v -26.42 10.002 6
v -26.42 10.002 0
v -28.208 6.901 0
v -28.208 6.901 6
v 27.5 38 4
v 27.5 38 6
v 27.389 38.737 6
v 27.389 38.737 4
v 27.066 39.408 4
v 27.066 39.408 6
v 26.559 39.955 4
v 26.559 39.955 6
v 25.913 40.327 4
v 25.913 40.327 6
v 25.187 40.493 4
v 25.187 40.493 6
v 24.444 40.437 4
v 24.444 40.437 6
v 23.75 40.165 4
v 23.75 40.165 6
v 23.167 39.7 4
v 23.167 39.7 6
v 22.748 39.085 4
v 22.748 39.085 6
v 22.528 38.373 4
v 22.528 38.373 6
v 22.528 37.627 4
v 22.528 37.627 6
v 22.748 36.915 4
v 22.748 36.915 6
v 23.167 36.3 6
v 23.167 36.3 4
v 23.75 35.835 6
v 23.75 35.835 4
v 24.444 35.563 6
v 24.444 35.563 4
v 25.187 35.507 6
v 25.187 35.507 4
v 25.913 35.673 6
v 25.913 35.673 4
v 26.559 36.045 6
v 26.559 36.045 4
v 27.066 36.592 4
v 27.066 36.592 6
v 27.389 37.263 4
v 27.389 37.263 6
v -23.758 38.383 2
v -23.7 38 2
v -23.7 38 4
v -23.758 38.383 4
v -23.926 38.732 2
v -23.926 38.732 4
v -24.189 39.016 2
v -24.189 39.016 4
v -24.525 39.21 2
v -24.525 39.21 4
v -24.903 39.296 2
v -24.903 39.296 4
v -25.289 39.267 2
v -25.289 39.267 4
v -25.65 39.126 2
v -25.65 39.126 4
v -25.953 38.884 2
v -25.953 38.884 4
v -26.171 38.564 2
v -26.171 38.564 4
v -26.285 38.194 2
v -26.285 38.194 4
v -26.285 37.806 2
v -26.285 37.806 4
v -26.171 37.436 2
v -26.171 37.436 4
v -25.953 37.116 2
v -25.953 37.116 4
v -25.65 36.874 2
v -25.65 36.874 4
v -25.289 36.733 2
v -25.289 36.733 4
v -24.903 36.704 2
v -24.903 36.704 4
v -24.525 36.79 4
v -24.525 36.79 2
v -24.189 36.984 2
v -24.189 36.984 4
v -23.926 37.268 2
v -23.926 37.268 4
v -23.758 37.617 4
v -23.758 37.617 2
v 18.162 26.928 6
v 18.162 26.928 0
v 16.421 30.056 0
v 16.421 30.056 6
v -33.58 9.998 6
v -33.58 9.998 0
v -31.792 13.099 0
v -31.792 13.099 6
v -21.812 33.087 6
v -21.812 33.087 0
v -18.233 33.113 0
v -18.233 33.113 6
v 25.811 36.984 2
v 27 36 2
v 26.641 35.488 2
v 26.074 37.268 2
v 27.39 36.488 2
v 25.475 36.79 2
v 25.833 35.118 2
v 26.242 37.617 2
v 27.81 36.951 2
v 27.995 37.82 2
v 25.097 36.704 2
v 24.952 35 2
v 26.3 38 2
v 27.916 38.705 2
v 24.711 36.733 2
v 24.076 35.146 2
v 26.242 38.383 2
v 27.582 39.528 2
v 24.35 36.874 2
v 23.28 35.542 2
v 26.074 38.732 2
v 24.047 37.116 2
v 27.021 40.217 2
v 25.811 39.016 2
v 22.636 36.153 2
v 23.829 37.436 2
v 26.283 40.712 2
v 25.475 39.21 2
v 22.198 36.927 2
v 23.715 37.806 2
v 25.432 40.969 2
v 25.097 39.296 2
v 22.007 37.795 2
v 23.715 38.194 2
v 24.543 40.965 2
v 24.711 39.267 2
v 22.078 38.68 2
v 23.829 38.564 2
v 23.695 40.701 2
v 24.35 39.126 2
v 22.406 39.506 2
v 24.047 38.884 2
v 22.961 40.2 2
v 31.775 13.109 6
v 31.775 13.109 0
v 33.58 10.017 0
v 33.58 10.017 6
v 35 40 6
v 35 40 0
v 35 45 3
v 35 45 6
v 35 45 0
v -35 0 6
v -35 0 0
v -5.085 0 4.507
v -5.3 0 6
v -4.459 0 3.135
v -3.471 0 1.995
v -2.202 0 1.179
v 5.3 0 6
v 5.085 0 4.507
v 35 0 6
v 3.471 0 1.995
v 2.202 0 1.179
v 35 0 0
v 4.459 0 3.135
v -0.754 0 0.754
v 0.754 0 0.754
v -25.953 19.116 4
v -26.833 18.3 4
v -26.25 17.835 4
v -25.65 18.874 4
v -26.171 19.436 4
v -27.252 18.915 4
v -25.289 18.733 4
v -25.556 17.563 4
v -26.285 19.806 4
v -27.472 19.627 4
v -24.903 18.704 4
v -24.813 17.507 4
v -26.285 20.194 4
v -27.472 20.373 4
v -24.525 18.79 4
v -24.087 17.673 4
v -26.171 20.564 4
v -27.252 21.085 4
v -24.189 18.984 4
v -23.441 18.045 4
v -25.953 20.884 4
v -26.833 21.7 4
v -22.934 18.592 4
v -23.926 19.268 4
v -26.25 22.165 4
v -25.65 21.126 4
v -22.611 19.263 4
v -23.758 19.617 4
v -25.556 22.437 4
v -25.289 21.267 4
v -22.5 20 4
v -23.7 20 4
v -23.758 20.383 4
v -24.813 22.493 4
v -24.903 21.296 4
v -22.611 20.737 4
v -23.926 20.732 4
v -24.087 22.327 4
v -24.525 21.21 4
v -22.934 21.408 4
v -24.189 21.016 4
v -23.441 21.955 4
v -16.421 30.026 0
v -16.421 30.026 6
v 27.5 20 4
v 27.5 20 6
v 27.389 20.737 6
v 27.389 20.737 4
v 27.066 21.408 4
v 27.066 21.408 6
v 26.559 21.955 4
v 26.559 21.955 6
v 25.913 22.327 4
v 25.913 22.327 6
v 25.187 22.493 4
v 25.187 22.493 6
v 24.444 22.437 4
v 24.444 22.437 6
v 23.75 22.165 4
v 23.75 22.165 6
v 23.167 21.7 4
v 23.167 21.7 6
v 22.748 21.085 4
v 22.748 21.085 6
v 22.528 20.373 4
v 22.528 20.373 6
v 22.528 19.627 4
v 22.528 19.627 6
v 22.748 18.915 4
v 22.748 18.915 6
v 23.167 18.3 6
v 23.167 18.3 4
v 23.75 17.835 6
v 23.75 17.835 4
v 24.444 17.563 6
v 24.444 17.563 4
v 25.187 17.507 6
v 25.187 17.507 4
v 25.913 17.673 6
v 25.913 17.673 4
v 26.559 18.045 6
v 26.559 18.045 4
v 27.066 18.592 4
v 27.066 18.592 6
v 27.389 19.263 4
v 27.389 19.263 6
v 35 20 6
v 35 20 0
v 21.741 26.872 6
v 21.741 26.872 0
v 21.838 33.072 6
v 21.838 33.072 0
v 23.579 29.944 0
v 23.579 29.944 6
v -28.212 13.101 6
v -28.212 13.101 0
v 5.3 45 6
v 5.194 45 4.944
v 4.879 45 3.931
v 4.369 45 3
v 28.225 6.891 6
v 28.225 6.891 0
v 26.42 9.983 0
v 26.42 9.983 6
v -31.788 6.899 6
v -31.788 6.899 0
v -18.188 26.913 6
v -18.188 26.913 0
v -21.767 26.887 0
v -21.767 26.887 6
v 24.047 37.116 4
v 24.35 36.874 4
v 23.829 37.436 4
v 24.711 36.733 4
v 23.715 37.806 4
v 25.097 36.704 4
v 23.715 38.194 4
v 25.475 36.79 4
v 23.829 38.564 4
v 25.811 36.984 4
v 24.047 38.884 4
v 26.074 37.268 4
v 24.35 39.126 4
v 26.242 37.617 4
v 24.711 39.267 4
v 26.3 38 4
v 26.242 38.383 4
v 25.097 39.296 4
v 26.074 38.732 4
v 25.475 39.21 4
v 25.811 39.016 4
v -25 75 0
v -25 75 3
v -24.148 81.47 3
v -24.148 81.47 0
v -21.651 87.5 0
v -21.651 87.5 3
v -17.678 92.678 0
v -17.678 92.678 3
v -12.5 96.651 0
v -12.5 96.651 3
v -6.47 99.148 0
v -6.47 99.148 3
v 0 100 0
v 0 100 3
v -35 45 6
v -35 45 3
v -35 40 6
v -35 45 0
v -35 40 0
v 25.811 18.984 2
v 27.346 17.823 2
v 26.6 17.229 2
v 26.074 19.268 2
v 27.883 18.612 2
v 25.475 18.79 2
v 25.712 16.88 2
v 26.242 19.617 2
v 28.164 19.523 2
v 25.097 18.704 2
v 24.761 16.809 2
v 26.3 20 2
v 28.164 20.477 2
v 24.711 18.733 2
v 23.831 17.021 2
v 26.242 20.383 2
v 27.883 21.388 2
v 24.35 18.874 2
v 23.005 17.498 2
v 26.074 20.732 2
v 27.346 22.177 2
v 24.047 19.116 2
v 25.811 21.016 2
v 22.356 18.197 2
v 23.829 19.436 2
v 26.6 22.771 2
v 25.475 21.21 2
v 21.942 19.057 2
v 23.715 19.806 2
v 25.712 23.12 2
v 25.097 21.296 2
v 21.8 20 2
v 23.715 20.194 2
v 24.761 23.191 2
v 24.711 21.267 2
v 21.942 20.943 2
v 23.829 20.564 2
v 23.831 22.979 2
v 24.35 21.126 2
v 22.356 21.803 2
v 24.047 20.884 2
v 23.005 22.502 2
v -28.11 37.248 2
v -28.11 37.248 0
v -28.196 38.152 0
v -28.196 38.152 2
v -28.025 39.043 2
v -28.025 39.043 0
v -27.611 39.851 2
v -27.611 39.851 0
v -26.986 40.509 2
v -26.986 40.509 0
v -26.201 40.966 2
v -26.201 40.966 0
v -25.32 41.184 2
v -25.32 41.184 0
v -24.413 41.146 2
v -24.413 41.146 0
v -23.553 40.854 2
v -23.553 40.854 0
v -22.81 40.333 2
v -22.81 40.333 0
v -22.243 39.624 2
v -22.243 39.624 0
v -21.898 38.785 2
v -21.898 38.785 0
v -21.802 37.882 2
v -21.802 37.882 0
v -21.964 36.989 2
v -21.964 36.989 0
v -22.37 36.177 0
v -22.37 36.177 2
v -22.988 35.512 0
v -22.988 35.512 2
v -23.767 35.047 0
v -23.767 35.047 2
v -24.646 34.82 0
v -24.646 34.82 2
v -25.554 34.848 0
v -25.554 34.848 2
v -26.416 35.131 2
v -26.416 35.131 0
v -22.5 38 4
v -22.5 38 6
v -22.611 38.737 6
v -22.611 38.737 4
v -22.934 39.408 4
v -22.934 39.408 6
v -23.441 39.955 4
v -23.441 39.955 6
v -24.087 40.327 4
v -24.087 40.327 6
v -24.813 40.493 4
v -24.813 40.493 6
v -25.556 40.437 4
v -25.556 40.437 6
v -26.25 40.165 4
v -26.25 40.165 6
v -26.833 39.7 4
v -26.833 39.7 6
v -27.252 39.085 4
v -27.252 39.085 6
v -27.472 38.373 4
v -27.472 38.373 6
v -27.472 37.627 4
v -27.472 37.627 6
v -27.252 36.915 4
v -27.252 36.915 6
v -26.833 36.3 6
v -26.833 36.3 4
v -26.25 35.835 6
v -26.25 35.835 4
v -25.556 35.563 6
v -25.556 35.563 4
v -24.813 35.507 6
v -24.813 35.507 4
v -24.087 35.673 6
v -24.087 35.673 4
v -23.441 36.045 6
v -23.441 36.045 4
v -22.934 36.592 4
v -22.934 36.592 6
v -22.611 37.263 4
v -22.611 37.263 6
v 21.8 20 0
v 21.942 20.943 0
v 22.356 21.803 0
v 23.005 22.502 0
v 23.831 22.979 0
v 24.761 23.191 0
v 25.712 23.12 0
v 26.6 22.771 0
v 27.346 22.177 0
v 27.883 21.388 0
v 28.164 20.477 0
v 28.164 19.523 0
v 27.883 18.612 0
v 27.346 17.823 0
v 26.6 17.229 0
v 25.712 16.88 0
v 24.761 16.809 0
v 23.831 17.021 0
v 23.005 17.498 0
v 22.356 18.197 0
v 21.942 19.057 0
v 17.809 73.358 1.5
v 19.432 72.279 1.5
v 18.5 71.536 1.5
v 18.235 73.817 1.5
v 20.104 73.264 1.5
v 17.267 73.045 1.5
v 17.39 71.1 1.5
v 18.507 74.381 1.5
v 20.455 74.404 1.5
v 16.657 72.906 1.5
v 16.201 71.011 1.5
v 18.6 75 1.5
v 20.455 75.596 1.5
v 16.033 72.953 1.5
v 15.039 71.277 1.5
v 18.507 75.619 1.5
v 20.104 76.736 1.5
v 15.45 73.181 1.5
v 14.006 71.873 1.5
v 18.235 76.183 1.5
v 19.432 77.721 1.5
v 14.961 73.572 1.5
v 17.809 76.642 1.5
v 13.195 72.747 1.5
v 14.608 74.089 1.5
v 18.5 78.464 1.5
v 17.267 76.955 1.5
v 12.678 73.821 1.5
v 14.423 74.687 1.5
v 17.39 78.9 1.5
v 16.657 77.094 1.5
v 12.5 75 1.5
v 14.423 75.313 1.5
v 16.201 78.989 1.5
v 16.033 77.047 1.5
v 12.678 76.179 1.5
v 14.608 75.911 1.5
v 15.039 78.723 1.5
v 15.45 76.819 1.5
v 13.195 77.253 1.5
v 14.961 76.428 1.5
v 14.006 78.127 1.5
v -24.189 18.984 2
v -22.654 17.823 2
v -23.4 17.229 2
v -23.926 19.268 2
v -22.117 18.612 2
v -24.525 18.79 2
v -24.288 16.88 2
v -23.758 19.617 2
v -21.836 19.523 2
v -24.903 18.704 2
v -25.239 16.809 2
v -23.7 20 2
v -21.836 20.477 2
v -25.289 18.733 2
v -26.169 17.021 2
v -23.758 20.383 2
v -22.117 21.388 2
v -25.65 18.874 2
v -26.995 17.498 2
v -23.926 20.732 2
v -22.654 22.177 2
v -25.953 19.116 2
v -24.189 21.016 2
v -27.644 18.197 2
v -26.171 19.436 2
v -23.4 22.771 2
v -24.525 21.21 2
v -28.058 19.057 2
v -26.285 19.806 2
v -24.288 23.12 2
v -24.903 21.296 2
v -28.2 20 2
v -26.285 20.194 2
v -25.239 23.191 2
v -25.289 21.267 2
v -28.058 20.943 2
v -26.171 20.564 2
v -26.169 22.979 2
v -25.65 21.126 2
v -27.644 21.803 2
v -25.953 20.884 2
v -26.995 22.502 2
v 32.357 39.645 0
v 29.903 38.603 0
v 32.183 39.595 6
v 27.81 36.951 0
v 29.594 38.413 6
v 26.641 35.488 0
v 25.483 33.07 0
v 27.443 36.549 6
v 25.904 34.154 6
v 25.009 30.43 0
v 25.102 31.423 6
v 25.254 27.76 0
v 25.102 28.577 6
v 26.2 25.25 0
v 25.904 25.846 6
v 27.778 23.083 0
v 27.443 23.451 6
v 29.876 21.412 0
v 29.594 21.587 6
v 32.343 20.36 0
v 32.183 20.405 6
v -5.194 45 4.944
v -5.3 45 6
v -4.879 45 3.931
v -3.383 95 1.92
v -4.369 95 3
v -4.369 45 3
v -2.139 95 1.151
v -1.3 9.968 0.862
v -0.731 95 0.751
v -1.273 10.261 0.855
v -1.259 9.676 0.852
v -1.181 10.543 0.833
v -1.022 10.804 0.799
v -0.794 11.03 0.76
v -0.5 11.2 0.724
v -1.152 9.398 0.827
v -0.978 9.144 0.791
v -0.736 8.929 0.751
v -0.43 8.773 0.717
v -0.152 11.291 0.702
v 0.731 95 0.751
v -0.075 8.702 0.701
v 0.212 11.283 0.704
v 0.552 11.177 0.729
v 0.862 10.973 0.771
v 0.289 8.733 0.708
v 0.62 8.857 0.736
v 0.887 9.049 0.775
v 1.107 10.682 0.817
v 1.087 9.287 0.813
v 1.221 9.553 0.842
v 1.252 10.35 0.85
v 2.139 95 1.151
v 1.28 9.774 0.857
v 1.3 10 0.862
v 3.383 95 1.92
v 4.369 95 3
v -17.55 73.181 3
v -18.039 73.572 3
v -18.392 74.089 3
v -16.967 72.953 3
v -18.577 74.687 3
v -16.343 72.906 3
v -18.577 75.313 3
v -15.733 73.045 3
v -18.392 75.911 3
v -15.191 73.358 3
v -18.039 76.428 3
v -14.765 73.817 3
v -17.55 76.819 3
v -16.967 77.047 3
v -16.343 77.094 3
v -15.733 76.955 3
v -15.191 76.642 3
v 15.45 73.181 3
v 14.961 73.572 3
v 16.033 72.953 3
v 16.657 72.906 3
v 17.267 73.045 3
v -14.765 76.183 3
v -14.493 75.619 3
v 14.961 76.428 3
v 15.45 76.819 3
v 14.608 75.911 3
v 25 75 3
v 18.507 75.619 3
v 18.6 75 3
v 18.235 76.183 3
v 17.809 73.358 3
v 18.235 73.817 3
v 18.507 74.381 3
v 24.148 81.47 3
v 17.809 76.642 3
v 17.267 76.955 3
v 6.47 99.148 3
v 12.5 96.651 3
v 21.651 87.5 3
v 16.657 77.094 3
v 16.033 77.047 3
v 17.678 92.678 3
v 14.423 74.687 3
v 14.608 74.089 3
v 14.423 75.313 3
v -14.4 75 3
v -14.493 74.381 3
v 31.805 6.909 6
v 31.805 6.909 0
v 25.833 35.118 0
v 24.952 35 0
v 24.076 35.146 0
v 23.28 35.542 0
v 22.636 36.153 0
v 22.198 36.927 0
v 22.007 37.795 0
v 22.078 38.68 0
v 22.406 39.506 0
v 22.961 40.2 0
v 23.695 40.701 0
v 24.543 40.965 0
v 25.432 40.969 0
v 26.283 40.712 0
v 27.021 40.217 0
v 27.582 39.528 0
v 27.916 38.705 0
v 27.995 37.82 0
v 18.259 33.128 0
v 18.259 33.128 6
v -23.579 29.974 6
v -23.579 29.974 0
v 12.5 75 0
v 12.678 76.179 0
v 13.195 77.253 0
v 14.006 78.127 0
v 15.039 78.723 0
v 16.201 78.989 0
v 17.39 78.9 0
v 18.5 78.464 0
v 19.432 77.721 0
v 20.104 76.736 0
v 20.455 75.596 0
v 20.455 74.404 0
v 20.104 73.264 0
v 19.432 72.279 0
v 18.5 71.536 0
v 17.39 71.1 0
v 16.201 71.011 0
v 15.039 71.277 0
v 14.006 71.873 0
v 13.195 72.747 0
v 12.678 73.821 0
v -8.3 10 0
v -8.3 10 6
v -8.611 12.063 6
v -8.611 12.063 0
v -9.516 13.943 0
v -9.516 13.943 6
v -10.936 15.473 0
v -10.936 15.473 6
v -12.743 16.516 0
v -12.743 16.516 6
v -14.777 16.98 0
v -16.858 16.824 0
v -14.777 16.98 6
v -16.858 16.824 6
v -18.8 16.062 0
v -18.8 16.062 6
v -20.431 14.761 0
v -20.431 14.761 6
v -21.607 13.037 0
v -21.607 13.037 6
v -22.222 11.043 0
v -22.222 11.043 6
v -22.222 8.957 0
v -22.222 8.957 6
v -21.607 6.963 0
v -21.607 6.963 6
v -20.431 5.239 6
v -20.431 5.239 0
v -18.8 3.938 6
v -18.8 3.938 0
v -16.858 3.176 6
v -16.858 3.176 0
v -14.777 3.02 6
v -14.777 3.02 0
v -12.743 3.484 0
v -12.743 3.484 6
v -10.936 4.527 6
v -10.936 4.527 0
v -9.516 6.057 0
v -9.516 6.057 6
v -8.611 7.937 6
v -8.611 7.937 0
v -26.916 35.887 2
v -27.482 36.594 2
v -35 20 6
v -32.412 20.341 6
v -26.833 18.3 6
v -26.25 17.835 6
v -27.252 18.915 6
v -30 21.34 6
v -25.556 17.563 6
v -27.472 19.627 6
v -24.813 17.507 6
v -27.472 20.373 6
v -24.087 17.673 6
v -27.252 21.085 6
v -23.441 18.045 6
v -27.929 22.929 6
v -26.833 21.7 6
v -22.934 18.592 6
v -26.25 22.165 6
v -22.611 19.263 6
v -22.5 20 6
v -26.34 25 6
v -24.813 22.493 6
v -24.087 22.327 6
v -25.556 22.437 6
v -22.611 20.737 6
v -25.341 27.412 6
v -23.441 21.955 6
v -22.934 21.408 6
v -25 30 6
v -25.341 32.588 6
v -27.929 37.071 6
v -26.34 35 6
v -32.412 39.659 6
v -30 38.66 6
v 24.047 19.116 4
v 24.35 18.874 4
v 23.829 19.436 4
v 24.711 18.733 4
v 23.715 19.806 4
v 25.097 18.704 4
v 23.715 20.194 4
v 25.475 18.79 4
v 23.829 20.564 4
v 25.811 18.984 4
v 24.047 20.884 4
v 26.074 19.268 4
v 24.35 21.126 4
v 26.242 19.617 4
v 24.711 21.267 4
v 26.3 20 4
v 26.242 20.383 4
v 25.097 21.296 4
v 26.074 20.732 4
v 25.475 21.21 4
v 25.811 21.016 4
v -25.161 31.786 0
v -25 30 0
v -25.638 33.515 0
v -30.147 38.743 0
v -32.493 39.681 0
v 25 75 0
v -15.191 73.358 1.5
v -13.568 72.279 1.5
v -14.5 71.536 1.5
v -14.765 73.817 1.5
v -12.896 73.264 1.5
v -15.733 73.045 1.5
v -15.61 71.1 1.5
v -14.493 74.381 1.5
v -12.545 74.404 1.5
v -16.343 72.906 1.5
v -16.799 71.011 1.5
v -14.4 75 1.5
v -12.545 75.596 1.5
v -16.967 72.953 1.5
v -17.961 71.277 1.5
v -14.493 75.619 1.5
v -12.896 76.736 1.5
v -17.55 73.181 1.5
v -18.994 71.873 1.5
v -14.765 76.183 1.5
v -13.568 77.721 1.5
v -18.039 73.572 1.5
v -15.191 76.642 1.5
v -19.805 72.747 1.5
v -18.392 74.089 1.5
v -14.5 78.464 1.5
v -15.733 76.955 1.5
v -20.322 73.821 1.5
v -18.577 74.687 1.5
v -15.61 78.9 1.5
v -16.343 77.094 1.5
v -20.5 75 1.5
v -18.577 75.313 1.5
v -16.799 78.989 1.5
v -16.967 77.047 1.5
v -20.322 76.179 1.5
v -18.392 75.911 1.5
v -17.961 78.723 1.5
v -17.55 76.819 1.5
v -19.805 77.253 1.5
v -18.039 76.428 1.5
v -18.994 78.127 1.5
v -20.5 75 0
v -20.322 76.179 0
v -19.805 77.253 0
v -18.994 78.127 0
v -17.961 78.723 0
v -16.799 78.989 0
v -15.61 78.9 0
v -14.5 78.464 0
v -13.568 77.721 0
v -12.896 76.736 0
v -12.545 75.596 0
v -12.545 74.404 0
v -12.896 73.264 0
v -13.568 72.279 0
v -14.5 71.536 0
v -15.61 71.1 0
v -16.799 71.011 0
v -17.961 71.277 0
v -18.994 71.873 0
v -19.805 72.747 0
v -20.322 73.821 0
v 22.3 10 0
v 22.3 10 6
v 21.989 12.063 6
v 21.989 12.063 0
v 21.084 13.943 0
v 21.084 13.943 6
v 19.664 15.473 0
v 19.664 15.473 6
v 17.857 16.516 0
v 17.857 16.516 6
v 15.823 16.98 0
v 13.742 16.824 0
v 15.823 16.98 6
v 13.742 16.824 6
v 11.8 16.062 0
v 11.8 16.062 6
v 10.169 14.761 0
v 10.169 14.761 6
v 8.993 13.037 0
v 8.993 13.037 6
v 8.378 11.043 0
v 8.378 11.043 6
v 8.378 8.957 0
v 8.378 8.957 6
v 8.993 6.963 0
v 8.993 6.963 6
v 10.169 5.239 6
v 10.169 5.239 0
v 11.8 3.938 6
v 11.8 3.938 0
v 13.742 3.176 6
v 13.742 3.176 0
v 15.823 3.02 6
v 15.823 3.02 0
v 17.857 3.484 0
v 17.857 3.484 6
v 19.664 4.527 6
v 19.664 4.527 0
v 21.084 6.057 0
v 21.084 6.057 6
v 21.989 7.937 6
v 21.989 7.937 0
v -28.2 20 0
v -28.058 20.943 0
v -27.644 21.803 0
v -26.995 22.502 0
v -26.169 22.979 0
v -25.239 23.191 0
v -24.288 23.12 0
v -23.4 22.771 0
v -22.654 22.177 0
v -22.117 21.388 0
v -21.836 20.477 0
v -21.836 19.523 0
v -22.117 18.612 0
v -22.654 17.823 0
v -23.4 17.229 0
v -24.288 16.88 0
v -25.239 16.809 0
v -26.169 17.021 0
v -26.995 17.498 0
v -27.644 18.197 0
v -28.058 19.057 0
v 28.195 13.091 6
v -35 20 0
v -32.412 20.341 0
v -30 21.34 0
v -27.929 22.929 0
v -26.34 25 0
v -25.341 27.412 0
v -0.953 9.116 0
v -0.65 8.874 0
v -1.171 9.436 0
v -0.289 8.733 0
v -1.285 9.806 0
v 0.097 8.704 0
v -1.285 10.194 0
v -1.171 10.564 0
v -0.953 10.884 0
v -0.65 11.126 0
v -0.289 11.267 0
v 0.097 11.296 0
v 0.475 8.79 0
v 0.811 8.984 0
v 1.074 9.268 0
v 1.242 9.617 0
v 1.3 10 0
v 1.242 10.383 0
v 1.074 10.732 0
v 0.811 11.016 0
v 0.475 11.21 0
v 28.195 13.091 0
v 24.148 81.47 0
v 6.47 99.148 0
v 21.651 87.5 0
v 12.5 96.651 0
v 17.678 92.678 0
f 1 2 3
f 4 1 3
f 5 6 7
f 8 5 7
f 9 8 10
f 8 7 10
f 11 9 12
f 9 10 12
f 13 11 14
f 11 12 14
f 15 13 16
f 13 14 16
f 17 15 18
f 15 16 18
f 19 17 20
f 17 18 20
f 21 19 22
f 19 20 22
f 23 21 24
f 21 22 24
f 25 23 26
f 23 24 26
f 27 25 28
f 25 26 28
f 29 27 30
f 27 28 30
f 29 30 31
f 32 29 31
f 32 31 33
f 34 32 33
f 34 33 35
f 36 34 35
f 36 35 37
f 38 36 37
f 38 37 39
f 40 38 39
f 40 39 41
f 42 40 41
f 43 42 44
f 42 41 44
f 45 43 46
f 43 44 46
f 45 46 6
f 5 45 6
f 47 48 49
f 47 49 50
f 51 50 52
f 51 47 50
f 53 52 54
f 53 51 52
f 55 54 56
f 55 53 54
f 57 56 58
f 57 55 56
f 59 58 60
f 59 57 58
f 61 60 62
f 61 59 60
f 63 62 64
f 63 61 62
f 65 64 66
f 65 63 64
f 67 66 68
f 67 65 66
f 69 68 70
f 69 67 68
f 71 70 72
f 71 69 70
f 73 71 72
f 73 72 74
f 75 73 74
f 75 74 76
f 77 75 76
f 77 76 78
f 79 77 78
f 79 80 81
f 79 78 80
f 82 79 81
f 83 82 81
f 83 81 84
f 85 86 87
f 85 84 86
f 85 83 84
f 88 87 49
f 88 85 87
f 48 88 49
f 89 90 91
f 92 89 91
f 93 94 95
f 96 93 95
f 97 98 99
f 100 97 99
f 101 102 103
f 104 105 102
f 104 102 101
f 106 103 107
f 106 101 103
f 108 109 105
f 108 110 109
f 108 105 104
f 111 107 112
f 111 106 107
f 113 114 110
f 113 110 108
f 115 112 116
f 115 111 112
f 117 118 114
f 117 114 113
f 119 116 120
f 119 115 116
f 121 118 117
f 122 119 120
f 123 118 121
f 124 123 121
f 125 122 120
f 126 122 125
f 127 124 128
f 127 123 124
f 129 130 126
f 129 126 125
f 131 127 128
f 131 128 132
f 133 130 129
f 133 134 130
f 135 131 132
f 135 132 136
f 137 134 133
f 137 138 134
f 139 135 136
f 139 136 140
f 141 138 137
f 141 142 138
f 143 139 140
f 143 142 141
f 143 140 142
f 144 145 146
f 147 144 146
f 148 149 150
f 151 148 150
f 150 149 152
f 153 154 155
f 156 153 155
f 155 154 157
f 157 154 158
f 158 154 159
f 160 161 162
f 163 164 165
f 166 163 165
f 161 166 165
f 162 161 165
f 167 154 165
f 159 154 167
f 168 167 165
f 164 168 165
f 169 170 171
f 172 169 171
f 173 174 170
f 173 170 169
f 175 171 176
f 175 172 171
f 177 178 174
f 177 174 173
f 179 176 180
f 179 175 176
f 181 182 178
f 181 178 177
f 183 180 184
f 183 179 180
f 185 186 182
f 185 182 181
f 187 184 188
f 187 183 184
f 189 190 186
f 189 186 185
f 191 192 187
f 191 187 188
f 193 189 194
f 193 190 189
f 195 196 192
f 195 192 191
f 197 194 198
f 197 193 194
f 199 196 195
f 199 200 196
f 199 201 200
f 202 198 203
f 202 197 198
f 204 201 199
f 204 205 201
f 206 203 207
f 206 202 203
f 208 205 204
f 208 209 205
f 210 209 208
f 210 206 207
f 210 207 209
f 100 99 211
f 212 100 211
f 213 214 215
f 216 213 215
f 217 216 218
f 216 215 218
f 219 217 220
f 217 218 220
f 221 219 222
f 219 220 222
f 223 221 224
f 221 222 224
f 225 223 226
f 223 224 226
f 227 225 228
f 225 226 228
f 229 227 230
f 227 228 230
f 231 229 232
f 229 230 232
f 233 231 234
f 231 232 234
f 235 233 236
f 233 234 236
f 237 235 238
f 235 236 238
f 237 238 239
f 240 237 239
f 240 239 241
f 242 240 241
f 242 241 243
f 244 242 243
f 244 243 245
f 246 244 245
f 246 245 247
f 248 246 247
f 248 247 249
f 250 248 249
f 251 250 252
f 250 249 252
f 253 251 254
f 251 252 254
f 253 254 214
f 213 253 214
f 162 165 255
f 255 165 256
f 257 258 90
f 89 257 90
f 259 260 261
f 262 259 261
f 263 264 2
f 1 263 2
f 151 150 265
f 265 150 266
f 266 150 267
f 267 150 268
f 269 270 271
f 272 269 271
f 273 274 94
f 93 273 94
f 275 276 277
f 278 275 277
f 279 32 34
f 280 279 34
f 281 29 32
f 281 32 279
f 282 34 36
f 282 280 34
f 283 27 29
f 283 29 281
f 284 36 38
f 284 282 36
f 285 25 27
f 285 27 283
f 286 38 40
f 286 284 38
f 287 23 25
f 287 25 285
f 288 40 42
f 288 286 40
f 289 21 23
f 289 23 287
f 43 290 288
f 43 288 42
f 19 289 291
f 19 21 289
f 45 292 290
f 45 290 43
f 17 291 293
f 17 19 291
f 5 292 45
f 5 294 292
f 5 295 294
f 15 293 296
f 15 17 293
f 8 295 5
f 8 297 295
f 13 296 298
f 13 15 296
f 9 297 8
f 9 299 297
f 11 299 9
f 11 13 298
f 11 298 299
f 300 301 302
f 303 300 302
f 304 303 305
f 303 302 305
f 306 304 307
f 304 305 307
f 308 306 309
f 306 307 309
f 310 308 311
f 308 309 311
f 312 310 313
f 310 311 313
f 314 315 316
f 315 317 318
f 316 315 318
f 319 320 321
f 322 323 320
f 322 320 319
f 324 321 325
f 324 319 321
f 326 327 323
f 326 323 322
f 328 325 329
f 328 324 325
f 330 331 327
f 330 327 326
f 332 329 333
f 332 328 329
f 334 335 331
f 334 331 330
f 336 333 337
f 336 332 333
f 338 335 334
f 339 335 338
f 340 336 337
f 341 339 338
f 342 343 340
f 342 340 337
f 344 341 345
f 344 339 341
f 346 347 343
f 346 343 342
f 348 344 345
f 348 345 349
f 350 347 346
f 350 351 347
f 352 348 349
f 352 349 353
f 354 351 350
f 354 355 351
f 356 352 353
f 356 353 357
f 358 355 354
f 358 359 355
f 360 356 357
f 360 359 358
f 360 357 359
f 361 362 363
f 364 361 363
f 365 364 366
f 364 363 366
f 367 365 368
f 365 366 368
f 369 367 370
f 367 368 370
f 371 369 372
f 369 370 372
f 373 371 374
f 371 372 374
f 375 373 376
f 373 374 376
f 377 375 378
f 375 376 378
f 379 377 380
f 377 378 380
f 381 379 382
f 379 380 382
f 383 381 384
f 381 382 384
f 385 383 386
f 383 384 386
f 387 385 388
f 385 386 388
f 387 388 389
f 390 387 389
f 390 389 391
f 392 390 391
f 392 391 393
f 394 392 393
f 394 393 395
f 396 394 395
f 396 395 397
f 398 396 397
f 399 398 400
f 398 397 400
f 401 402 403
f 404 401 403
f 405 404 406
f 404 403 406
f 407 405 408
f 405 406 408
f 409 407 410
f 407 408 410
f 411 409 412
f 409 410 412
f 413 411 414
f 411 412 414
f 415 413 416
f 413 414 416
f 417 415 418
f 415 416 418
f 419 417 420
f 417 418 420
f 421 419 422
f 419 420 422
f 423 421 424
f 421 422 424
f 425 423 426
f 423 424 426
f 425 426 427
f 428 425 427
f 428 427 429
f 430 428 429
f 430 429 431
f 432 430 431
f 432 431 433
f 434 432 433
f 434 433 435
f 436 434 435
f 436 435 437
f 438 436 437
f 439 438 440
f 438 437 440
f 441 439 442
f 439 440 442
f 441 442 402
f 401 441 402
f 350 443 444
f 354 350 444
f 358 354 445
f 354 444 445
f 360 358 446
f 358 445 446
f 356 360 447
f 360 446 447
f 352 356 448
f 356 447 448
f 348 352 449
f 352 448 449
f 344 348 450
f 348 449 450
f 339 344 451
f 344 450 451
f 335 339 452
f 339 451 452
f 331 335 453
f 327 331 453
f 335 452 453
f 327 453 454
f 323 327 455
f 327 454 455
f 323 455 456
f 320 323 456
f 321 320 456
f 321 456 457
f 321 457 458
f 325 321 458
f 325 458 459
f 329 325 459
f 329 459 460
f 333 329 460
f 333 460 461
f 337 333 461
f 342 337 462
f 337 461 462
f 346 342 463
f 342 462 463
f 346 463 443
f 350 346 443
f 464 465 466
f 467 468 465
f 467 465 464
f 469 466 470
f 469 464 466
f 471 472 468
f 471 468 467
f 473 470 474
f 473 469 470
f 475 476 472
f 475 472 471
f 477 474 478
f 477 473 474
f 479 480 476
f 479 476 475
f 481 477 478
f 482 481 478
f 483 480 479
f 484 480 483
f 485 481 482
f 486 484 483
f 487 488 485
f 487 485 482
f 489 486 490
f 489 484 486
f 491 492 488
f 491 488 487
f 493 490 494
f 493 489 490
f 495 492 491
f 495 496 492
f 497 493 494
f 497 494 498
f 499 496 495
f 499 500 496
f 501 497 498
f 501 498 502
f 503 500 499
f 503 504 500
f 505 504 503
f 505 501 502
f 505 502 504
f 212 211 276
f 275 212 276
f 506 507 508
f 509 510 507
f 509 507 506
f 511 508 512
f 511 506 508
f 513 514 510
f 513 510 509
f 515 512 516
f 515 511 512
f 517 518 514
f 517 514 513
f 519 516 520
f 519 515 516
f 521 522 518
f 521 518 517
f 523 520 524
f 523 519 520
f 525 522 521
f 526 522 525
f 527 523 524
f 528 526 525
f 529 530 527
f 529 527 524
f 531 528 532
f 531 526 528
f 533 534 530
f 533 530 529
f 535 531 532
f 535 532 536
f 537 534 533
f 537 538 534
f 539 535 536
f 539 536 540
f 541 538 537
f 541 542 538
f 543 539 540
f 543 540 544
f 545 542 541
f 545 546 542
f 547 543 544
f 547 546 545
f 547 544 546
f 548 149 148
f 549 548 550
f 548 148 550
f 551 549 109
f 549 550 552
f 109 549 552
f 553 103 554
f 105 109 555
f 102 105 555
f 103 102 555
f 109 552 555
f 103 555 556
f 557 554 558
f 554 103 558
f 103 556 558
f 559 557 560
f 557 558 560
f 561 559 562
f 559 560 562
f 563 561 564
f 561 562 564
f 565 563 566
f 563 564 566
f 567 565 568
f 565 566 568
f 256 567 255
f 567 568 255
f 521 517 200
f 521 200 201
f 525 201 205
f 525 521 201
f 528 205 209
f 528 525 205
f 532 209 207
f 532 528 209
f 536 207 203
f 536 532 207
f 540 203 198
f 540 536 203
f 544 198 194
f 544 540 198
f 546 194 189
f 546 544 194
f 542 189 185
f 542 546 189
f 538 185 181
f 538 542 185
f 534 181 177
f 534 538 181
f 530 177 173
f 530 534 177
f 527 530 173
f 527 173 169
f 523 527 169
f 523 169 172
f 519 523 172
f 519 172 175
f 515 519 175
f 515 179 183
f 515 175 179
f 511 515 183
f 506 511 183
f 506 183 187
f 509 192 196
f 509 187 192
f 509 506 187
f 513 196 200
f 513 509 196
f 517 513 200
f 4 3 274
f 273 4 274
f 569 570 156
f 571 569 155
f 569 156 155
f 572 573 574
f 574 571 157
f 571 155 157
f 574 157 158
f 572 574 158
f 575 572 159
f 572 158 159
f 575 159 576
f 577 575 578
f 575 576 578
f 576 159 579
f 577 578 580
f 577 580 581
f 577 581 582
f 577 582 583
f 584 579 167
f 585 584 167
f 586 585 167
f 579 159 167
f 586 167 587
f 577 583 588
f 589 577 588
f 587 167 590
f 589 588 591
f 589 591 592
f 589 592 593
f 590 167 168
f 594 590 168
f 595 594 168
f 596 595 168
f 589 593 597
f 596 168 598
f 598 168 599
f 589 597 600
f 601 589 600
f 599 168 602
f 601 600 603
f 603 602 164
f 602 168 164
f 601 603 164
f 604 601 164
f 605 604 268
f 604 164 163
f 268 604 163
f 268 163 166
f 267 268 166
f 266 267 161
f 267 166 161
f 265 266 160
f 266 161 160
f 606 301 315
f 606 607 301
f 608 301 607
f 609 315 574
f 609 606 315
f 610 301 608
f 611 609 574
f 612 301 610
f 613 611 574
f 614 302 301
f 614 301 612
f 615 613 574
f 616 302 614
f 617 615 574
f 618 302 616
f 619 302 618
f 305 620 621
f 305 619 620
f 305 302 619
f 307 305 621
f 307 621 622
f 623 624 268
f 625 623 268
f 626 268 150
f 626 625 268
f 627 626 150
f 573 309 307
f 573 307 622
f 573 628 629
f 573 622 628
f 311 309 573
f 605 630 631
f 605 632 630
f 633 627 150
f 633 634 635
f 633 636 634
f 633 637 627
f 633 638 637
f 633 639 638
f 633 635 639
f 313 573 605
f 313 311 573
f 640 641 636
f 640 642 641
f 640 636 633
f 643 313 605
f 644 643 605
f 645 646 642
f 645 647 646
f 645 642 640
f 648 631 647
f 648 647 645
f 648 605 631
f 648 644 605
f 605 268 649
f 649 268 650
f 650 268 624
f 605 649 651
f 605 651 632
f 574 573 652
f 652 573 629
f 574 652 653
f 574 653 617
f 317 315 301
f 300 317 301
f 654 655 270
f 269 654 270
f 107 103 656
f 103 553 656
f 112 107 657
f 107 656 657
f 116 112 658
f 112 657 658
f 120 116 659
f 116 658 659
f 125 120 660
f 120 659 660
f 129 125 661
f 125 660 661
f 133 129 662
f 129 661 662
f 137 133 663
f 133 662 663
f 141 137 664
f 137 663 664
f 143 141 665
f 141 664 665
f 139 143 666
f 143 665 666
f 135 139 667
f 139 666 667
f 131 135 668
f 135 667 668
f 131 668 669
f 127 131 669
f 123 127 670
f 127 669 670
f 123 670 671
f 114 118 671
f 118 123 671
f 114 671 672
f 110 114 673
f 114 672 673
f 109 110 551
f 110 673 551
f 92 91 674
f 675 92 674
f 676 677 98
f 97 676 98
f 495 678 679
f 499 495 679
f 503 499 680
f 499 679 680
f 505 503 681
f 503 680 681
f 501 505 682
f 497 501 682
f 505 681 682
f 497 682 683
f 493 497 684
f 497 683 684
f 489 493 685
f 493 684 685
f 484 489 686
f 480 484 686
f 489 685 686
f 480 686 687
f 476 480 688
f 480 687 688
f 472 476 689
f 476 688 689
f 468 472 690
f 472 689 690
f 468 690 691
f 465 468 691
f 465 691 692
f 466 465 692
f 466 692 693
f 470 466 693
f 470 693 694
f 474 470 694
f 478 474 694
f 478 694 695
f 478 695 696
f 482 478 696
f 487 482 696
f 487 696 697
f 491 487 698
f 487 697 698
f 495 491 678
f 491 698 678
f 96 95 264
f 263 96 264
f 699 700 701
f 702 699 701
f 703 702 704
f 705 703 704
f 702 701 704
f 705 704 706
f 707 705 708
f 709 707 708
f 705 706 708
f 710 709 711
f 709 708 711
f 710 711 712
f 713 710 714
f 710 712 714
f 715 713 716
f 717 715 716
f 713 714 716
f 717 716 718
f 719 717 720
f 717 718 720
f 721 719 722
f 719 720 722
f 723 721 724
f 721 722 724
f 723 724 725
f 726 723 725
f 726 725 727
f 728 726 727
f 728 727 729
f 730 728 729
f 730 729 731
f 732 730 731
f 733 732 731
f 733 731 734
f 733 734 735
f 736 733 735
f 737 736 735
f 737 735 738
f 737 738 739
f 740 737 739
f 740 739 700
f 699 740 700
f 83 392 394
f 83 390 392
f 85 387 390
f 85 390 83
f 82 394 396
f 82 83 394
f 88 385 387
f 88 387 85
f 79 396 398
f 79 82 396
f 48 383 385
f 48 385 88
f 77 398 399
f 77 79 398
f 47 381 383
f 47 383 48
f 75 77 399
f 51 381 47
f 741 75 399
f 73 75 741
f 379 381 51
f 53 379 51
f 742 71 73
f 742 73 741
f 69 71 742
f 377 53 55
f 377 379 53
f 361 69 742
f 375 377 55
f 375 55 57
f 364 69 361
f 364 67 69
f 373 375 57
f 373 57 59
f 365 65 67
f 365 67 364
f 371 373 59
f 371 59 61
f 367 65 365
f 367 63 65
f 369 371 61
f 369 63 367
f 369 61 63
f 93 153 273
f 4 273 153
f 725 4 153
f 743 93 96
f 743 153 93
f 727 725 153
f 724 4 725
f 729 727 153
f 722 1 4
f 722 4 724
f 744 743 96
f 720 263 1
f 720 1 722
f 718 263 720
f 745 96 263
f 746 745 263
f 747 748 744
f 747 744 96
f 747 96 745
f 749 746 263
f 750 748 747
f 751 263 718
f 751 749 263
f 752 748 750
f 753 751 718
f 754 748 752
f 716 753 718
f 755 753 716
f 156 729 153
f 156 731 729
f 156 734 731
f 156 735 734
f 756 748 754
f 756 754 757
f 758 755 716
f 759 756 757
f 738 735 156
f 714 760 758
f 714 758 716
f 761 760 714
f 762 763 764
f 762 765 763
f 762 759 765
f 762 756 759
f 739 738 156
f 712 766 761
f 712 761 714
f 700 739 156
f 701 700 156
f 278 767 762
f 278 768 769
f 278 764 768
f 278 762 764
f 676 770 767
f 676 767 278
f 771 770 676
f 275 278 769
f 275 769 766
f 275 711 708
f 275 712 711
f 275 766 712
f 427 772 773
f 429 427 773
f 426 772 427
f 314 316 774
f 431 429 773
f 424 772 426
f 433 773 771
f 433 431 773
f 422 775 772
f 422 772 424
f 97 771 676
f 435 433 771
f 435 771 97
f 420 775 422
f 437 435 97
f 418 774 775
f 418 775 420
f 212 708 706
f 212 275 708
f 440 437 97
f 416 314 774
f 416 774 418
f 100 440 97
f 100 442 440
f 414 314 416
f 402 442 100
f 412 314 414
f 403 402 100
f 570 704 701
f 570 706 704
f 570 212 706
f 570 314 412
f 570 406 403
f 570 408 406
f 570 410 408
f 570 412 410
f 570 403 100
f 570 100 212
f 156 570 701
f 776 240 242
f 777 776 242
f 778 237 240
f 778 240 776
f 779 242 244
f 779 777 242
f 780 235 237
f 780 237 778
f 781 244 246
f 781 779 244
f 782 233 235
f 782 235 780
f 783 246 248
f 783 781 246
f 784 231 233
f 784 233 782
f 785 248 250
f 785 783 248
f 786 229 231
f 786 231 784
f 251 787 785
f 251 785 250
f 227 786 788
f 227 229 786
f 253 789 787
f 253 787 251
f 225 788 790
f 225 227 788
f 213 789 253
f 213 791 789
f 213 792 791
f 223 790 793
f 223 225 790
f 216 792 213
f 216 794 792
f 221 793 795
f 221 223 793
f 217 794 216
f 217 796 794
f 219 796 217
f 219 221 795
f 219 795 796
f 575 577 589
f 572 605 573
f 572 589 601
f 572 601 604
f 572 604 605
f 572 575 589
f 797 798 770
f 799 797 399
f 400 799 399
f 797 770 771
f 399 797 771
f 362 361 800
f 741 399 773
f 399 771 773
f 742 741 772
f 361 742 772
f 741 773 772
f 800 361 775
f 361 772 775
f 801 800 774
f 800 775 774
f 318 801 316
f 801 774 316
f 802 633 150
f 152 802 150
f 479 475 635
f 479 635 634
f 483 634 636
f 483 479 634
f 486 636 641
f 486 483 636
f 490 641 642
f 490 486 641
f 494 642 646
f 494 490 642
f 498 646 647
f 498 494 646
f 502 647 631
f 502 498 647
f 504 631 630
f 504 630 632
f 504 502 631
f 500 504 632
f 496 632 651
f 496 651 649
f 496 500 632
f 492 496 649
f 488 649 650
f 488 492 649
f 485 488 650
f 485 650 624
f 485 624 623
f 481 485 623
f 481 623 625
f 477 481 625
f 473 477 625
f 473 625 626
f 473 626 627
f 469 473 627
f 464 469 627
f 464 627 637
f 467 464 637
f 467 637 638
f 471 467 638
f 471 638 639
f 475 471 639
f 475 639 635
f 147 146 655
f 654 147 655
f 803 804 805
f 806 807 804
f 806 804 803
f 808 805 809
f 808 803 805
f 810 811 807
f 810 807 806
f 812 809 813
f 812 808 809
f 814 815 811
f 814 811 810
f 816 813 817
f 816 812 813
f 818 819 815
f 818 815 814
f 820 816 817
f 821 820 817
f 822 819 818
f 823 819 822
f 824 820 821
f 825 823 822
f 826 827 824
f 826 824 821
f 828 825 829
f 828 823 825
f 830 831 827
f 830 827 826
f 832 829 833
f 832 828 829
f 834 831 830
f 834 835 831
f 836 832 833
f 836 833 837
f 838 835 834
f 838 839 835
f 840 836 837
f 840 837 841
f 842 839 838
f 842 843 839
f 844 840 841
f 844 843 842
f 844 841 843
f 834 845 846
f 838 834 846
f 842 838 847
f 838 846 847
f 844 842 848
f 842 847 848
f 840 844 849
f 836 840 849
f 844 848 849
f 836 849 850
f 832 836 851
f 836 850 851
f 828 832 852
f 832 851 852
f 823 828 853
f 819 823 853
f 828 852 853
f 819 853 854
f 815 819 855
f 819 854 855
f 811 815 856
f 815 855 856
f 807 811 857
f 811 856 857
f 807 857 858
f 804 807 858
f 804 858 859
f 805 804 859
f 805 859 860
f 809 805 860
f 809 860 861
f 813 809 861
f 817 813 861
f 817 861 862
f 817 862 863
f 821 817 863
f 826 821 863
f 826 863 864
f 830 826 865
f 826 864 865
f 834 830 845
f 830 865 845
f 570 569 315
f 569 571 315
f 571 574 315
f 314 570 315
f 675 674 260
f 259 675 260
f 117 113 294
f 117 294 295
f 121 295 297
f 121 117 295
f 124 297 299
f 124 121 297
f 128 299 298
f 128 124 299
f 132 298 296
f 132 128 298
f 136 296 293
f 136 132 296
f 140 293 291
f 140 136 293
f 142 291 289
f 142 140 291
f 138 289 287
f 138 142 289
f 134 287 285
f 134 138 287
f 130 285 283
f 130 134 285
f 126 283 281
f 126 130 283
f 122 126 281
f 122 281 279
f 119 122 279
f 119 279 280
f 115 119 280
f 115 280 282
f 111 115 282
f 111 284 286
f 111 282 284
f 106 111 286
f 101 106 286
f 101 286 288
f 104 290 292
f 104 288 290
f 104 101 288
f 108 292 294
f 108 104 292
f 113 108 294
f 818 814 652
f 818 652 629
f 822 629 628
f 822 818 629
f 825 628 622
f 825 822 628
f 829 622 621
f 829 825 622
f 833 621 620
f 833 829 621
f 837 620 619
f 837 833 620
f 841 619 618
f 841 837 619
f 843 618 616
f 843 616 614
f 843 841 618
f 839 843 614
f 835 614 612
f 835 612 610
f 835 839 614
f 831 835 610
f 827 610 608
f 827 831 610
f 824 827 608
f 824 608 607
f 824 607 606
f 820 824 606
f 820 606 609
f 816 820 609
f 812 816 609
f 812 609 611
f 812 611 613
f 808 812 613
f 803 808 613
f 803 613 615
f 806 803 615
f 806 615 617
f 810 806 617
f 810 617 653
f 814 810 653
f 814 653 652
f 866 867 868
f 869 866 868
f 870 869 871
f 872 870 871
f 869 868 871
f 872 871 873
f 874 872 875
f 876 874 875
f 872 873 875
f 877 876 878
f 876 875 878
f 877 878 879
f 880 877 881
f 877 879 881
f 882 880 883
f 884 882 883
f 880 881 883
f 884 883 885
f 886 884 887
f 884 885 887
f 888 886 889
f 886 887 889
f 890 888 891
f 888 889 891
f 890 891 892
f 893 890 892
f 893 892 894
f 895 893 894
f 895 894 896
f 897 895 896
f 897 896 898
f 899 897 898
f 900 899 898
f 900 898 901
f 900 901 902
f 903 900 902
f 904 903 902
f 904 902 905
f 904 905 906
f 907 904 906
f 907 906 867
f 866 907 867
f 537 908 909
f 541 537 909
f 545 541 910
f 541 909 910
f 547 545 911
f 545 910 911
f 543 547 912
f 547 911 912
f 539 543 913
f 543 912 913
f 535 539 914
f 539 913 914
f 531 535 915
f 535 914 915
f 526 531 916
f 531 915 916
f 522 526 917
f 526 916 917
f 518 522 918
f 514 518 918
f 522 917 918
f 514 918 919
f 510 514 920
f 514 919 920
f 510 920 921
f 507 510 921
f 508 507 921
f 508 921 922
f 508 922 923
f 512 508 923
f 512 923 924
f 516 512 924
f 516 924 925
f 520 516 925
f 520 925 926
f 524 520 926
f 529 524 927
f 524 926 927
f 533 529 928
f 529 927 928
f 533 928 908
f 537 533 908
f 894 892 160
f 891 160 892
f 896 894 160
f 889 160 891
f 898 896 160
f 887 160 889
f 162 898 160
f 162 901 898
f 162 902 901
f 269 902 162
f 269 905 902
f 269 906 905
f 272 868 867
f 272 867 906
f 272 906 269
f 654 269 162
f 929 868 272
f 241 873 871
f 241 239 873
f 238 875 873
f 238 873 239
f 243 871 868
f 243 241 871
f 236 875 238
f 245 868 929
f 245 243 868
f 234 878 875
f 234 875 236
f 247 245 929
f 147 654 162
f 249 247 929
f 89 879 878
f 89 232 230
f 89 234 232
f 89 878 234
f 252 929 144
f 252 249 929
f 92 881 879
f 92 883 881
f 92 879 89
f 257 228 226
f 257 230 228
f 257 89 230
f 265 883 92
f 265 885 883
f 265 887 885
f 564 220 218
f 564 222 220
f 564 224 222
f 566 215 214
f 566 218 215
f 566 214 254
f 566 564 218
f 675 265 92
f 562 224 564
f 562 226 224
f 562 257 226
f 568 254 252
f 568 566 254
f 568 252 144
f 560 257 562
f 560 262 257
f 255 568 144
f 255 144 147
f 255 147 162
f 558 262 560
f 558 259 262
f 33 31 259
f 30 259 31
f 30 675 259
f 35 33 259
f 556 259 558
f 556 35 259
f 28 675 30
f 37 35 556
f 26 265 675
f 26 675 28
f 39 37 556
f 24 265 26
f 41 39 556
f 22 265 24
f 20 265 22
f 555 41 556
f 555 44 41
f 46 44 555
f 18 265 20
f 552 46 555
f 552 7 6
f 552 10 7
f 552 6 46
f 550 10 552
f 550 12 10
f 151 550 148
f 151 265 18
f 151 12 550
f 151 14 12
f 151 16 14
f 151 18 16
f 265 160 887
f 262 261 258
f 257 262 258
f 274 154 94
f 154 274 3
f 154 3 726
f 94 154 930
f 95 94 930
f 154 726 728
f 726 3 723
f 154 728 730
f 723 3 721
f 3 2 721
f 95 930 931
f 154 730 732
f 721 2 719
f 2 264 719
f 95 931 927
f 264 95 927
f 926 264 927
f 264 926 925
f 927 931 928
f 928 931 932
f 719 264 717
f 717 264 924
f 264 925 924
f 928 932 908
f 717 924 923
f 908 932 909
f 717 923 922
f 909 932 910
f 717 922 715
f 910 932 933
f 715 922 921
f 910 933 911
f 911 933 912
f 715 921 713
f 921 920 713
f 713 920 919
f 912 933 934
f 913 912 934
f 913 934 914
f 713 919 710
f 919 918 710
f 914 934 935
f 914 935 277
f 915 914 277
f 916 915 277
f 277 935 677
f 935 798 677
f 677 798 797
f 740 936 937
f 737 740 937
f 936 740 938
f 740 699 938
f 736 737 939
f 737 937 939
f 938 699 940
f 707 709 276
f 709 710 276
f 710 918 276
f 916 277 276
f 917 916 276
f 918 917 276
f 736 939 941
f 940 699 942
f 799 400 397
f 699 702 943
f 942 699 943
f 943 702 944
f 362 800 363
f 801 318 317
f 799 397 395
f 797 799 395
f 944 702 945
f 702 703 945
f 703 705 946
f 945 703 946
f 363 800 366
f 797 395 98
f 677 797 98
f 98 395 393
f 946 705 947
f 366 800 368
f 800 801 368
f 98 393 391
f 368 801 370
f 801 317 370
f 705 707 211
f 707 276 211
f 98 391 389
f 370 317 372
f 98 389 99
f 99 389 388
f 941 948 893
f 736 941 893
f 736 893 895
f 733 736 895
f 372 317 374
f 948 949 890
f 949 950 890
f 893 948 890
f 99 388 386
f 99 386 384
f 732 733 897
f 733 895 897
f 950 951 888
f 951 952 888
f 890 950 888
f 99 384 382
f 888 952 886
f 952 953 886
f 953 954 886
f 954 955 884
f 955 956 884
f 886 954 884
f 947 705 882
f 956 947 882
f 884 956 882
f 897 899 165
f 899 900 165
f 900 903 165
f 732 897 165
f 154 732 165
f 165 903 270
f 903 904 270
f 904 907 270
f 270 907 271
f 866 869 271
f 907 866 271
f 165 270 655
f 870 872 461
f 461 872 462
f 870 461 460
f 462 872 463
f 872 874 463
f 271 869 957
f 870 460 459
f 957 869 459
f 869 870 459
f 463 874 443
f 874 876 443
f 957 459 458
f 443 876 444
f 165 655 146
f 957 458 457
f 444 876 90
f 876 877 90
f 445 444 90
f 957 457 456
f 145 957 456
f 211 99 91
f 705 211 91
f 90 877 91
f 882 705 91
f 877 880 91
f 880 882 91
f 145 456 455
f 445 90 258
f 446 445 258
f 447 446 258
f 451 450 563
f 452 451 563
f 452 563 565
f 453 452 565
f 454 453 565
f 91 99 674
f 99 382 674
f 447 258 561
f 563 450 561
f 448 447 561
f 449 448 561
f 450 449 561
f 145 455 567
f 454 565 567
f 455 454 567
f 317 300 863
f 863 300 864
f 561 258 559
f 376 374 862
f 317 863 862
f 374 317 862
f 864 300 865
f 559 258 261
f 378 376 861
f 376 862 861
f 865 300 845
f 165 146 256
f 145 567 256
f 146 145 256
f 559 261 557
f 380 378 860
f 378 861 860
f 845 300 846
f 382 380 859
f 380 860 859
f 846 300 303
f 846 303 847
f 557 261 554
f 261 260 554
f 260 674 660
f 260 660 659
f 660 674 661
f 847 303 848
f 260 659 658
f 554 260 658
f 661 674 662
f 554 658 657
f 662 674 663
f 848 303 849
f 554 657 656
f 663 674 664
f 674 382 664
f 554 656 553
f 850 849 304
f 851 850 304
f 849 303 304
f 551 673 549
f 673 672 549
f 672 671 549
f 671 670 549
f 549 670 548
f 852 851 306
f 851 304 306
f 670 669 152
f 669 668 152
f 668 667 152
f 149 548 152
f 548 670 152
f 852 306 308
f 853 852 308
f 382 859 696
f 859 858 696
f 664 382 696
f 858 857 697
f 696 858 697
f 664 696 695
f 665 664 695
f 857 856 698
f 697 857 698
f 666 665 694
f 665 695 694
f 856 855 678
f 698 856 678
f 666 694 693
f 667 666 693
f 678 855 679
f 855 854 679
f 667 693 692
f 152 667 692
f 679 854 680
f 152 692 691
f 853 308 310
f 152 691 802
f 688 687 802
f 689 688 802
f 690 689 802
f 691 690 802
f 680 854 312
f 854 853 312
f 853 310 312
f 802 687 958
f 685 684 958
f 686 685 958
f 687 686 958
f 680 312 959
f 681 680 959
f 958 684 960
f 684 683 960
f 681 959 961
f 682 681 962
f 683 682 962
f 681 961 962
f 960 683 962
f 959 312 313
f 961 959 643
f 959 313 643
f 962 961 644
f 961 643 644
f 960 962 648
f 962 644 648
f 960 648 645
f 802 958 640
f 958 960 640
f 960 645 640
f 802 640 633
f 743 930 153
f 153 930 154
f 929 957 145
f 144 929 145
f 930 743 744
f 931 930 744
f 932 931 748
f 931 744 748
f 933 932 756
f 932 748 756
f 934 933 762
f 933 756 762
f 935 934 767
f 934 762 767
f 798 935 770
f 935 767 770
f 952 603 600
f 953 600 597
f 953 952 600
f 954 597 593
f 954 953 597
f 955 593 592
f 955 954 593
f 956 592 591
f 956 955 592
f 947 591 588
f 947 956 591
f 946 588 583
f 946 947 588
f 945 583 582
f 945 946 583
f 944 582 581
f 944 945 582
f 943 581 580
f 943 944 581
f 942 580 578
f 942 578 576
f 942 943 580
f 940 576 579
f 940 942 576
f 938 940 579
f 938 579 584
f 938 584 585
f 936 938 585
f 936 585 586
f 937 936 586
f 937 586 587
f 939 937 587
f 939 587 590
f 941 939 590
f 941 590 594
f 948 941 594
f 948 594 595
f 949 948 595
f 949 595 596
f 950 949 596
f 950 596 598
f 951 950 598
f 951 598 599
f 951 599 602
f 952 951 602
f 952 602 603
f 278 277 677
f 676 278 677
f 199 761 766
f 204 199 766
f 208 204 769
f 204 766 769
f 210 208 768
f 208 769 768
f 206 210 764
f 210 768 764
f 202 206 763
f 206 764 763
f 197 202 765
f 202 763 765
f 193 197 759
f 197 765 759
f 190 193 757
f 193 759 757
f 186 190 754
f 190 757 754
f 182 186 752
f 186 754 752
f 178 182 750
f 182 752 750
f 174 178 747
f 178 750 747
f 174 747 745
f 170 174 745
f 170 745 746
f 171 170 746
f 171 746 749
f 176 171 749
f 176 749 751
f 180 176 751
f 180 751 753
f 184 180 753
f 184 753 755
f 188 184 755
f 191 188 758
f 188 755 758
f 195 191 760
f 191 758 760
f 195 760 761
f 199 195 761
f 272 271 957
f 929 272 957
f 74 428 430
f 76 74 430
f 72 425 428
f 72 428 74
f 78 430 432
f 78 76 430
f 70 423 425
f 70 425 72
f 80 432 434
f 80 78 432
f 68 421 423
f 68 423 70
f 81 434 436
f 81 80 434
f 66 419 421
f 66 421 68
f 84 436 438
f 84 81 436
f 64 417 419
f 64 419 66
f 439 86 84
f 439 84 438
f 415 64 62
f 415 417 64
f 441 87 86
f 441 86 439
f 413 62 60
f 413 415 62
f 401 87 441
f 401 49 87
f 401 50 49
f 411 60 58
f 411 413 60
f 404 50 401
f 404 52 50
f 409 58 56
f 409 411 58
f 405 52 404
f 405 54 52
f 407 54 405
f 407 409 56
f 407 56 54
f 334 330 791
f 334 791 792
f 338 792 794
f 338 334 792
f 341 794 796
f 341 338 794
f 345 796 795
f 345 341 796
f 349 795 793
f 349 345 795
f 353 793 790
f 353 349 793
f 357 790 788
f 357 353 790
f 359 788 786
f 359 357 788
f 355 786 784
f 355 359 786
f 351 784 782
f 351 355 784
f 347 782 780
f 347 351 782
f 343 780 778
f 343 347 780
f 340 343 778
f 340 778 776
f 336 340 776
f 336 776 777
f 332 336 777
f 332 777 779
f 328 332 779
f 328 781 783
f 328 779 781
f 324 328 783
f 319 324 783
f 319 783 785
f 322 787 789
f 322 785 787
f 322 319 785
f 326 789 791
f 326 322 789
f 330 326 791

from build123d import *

# Parameters (mm, degrees)
SKETCH_1_R           = 1.3
EXTRUDE_1_DEPTH      = 6
SKETCH_1_3_R         = 2.1
EXTRUDE_2_DEPTH      = 3
SKETCH_3_R           = 5.3
CUT_EXTRUDE_1_DEPTH  = 95
SKETCH_6_R           = 3.2
SKETCH_6_R_2         = 3
CUT_EXTRUDE_3_DEPTH  = 2
SKETCH_9_R           = 4
CUT_EXTRUDE_6_DEPTH  = 1.5
CUT_EXTRUDE_7_DEPTH  = 106.990565621
CUT_EXTRUDE_8_DEPTH  = 107.117859012
SKETCH_12_R          = 7
CUT_EXTRUDE_9_DEPTH  = 107.117859012
SKETCH_13_R          = 2.5
CUT_EXTRUDE_11_DEPTH = 2


with BuildPart() as part:
    # 草图1 → 凸台-拉伸1 (new body)
    with BuildSketch(Plane.XY):
        Polygon((-35, 0), (0, 0), (35, 0), (35, 45), (0, 45), (-35, 45), align=None)
        Polygon((-26.420428959, 10.002120735), (-28.208377869, 6.901060912), (-31.78794891, 6.898940176), (-33.579571041, 9.997879265), (-31.791622131, 13.098939088), (-28.21205109, 13.101059824), align=None, mode=Mode.SUBTRACT)
        with Locations((-25, 20)):
            Circle(SKETCH_1_R, mode=Mode.SUBTRACT)
        Polygon((-16.420523373, 30.026084728), (-18.187671649, 26.913124673), (-21.767148276, 26.887039945), (-23.579476627, 29.973915272), (-21.812328351, 33.086875327), (-18.232851724, 33.112960055), align=None, mode=Mode.SUBTRACT)
        with Locations((-25, 38)):
            Circle(SKETCH_1_R, mode=Mode.SUBTRACT)
        with Locations((0, 10)):
            Circle(SKETCH_1_R, mode=Mode.SUBTRACT)
        Polygon((33.579530154, 10.017239862), (31.804695235, 6.908655884), (28.225165081, 6.891416023), (26.420469846, 9.982760138), (28.195304765, 13.091344116), (31.774834919, 13.108583977), align=None, mode=Mode.SUBTRACT)
        with Locations((25, 20)):
            Circle(SKETCH_1_R, mode=Mode.SUBTRACT)
        Polygon((23.579135684, 29.944133288), (21.74118585, 26.872444218), (18.162050166, 26.92831093), (16.420864316, 30.055866712), (18.25881415, 33.127555782), (21.837949834, 33.07168907), align=None, mode=Mode.SUBTRACT)
        with Locations((25, 38)):
            Circle(SKETCH_1_R, mode=Mode.SUBTRACT)
    extrude(amount=EXTRUDE_1_DEPTH)

    # 草图1<3> → 凸台-拉伸2 (add)
    with BuildSketch(Plane.XY):
        Polygon((0, 45), (35, 45), (35, 100), (-35, 100), (-35, 45), align=None)
        with Locations((-16.5, 75)):
            Circle(SKETCH_1_3_R, mode=Mode.SUBTRACT)
        with Locations((16.5, 75)):
            Circle(SKETCH_1_3_R, mode=Mode.SUBTRACT)
    extrude(amount=EXTRUDE_2_DEPTH)

    # 草图3 → 切除-拉伸1 (cut)
    with BuildSketch(Plane(origin=(0, 0, 0), x_dir=(-1, 0, 0), z_dir=(0, -1, 0))):
        with Locations((0, -6)):
            Circle(SKETCH_3_R)
    extrude(amount=-CUT_EXTRUDE_1_DEPTH, mode=Mode.SUBTRACT)

    # 草图6 → 切除-拉伸3 (cut)
    with BuildSketch(Plane(origin=(0, 0, 0), x_dir=(-1, 0, 0), z_dir=(0, 0, -1))):
        with Locations((25, 38)):
            Circle(SKETCH_6_R)
        with Locations((25, 20)):
            Circle(SKETCH_6_R)
        with Locations((-25, 20)):
            Circle(SKETCH_6_R)
        with Locations((-25, 38)):
            Circle(SKETCH_6_R_2)
    extrude(amount=-CUT_EXTRUDE_3_DEPTH, mode=Mode.SUBTRACT)

    # 草图9 → 切除-拉伸6 (cut)
    with BuildSketch(Plane(origin=(0, 0, 0), x_dir=(-1, 0, 0), z_dir=(0, 0, -1))):
        with Locations((-16.5, 75)):
            Circle(SKETCH_9_R)
        with Locations((16.5, 75)):
            Circle(SKETCH_9_R)
    extrude(amount=-CUT_EXTRUDE_6_DEPTH, mode=Mode.SUBTRACT)

    # 草图10 → 切除-拉伸7 (cut, through all)
    with BuildSketch(Plane.XY.offset(3)):
        with BuildLine():
            Line((35, 100), (0, 100))
            ThreePointArc((0, 100), (17.67766953, 92.67766953), (25, 75))
            Line((25, 75), (35, 45))
            Line((35, 45), (35, 100))
        make_face()
        with BuildLine():
            Line((-35, 45), (-25, 75))
            ThreePointArc((-25, 75), (-17.67766953, 92.67766953), (0, 100))
            Line((0, 100), (-35, 100))
            Line((-35, 100), (-35, 45))
        make_face()
    extrude(amount=-CUT_EXTRUDE_7_DEPTH, mode=Mode.SUBTRACT)

    # 草图11 → 切除-拉伸8 (cut, through all)
    with BuildSketch(Plane.XY.offset(6)):
        with BuildLine():
            ThreePointArc((-35, 20), (-25, 30), (-35, 40))
            Line((-35, 40), (-35, 20))
        make_face()
        with BuildLine():
            Line((35, 20), (35, 40))
            ThreePointArc((35, 40), (25, 30), (35, 20))
        make_face()
    extrude(amount=-CUT_EXTRUDE_8_DEPTH, mode=Mode.SUBTRACT)

    # 草图12 → 切除-拉伸9 (cut, through all)
    with BuildSketch(Plane.XY.offset(6)):
        with Locations((-15.3, 10)):
            Circle(SKETCH_12_R)
        with Locations((15.3, 10)):
            Circle(SKETCH_12_R)
    extrude(amount=-CUT_EXTRUDE_9_DEPTH, mode=Mode.SUBTRACT)

    # 草图13 → 切除-拉伸11 (cut)
    with BuildSketch(Plane.XY.offset(6)):
        with Locations((-25, 20)):
            Circle(SKETCH_13_R)
        with Locations((25, 20)):
            Circle(SKETCH_13_R)
        with Locations((25, 38)):
            Circle(SKETCH_13_R)
        with Locations((-25, 38)):
            Circle(SKETCH_13_R)
    extrude(amount=-CUT_EXTRUDE_11_DEPTH, mode=Mode.SUBTRACT)


solid = part.part
